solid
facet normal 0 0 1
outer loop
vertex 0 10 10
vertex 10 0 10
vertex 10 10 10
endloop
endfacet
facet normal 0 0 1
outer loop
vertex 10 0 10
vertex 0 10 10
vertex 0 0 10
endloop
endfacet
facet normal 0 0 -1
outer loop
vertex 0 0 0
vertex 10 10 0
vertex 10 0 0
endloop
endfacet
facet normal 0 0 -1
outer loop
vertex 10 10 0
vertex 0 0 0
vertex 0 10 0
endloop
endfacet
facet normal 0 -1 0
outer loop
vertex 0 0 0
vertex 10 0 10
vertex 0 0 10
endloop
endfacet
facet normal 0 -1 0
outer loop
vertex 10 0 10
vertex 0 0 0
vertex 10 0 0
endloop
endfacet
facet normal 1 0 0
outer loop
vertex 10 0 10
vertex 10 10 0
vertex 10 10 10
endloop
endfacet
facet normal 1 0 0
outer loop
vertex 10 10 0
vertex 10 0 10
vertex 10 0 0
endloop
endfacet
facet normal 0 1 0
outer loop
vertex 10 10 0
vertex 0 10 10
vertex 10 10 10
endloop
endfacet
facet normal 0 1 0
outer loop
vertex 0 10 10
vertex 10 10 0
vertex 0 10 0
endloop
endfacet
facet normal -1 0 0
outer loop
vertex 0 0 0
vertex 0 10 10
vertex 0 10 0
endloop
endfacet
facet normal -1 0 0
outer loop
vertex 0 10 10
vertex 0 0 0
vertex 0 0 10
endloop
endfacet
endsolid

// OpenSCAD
// Generated test SCAD for job_1787745720594_46953f2c
module test_part() {
  cube([10, 10, 10]);
}
test_part();
